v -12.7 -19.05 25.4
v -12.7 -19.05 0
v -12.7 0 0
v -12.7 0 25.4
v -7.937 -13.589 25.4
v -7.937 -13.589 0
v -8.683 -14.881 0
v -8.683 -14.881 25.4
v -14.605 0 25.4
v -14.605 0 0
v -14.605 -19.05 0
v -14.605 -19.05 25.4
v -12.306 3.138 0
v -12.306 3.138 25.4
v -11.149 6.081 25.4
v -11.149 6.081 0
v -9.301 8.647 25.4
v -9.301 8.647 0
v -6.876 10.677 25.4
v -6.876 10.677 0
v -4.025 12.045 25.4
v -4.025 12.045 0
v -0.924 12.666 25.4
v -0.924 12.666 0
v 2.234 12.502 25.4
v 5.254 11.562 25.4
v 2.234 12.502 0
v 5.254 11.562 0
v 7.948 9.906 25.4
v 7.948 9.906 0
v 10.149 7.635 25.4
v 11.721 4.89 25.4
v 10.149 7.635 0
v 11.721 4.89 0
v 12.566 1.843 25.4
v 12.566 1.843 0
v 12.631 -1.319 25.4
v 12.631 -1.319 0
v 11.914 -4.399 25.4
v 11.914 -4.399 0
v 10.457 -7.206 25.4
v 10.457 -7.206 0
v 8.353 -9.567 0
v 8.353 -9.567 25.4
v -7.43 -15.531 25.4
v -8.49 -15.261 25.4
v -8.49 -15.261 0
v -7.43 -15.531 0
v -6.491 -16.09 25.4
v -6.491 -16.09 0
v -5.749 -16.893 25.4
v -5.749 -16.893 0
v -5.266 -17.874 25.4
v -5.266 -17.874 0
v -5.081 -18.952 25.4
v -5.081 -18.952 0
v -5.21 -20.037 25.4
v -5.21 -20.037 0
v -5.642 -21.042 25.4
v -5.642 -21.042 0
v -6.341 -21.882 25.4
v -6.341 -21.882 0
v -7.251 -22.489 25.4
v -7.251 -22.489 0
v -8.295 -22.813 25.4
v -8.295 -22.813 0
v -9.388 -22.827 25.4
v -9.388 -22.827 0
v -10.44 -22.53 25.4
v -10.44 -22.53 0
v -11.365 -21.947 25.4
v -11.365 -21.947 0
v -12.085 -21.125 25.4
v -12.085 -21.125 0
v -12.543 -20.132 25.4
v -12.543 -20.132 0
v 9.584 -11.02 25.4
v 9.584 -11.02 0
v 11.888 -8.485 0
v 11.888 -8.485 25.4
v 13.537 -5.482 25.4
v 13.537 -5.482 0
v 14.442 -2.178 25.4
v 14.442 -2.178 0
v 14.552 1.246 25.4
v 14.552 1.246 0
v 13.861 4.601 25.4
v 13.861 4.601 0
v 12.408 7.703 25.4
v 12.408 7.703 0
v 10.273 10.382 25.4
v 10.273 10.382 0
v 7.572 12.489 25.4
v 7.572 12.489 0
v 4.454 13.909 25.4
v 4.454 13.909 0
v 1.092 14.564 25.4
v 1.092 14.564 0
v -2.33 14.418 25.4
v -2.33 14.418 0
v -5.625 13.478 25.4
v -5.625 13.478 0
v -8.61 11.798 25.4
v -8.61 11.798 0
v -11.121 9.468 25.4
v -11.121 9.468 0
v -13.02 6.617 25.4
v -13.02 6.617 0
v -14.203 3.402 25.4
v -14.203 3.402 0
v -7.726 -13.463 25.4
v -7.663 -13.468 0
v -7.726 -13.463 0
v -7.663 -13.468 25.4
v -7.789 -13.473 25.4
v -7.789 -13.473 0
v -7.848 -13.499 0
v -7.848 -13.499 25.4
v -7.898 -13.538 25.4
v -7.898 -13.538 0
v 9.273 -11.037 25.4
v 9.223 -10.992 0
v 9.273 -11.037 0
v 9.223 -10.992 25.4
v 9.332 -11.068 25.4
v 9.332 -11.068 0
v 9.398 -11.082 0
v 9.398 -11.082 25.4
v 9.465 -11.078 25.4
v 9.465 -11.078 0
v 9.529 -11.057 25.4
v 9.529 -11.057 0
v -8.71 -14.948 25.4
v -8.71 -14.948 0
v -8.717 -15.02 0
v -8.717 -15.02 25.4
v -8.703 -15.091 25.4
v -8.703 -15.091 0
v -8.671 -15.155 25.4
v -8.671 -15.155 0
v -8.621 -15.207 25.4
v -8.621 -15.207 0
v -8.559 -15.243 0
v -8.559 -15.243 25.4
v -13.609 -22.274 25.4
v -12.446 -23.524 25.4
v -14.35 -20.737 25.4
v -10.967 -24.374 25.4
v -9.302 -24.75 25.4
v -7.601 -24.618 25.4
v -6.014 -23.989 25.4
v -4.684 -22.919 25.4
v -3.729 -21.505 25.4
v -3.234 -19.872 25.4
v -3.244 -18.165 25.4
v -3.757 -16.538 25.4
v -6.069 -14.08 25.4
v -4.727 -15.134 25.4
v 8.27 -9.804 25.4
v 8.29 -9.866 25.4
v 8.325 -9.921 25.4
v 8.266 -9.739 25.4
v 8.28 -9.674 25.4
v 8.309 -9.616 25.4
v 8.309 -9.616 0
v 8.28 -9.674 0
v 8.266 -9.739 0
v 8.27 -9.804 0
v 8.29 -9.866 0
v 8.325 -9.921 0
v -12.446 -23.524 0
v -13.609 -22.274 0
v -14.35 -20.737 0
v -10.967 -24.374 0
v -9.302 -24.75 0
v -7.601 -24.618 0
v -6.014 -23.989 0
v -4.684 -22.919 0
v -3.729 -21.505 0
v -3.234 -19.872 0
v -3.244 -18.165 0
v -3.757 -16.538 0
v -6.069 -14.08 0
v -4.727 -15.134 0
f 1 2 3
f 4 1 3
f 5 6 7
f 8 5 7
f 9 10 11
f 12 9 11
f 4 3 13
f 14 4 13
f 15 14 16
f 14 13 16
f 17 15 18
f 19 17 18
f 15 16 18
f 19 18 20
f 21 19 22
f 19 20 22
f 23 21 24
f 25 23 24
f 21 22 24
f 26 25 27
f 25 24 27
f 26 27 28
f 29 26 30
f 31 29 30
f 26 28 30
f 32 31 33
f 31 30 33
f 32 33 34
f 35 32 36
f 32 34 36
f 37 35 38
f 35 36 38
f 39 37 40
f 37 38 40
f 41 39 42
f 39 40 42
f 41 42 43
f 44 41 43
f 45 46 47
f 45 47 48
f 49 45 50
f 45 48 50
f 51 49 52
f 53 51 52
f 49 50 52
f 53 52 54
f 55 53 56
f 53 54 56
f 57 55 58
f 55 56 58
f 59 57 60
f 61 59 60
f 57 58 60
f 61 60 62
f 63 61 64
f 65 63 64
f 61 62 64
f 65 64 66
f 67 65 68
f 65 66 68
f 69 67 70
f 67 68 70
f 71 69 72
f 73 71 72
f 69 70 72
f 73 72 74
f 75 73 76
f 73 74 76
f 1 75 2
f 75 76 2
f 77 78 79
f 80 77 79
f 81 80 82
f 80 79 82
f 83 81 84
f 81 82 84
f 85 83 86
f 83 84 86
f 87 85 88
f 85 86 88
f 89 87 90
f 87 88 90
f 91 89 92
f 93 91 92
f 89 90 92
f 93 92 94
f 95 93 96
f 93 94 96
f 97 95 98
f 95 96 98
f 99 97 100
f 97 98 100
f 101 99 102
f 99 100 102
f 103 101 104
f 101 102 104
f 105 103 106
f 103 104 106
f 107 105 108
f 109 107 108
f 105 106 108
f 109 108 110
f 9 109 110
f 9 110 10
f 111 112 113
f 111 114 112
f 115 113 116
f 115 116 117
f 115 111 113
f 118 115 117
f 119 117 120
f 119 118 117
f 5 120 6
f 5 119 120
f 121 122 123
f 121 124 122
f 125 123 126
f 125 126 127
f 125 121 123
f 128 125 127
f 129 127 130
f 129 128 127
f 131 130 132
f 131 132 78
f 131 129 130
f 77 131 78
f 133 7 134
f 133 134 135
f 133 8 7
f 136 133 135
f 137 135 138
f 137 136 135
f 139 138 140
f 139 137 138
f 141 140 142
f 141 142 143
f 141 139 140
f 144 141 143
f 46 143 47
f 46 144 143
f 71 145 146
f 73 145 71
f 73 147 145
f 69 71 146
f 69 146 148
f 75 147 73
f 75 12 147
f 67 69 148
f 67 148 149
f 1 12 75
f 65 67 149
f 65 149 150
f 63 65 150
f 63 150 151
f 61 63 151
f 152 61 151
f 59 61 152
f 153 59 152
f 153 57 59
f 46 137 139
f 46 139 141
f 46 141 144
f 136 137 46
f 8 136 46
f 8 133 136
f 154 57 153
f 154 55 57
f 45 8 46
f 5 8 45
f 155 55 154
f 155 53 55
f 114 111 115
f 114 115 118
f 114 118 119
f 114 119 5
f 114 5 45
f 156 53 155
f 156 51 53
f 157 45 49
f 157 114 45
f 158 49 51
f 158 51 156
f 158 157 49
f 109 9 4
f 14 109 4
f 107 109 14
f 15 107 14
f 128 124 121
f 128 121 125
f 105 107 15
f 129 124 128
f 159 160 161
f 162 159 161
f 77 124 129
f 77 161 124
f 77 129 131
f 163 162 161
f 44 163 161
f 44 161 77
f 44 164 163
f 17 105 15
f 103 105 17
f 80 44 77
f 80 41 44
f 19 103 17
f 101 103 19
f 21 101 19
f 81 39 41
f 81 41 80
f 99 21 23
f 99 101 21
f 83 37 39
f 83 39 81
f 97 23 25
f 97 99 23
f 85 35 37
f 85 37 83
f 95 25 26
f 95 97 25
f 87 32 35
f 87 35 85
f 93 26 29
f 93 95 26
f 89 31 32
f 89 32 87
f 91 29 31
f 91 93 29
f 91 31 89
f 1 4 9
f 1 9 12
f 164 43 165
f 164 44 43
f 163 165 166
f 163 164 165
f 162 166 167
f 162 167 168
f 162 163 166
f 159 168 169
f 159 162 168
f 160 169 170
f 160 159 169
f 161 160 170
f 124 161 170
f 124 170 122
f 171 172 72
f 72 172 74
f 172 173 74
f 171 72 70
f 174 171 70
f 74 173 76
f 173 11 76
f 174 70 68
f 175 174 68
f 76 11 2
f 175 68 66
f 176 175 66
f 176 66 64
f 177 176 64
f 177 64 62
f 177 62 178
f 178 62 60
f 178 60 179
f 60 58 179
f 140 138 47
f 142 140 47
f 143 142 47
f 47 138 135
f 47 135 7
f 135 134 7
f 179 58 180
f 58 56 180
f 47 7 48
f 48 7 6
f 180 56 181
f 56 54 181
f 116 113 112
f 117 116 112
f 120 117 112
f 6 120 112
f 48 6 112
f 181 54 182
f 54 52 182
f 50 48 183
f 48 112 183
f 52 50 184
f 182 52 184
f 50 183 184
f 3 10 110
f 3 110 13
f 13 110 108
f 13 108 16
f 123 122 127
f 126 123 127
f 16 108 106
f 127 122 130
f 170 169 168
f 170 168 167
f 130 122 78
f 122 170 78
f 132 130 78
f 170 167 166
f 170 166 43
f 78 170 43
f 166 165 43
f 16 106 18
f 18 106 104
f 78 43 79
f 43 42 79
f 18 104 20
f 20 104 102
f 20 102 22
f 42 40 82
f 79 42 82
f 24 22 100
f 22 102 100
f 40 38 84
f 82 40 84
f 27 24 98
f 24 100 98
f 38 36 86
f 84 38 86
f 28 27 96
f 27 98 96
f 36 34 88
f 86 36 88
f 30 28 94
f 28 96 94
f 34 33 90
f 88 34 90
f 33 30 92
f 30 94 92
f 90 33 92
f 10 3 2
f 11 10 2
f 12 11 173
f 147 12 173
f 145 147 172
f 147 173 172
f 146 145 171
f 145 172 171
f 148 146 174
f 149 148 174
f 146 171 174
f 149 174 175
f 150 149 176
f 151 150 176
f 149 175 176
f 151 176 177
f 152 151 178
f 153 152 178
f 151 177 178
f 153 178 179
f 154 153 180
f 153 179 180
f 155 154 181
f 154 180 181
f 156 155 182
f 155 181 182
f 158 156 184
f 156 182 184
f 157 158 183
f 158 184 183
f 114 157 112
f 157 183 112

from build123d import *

# Parameters (mm, degrees)
F1_DEPTH = 25.4
F2_R     = 0.254


with BuildPart() as f1:
    # F0 (on Top) → F1 (new body)
    with BuildSketch(Plane.XY):
        with BuildLine():
            Line((-12.7, -19.05), (-12.7, 0))
            ThreePointArc((-12.7, 0), (5.367252, 11.510109), (8.163403, -9.728764))
            Line((8.163403, -9.728764), (9.387913, -11.188079))
            ThreePointArc((9.387913, -11.188079), (6.17234, 13.236625), (-14.605, 0))
            Line((-14.605, 0), (-14.605, -19.05))
            ThreePointArc((-14.605, -19.05), (-5.23671, -23.444849), (-7.845702, -13.431222))
            Line((-7.845702, -13.431222), (-8.89, -15.24))
            ThreePointArc((-8.89, -15.24), (-6.195923, -21.744077), (-12.7, -19.05))
        make_face()
    extrude(amount=F1_DEPTH)

    # F2
    f2_edges = [f1.edges().sort_by_distance(p)[0] for p in [
        (8.163403, -9.728764, 12.7),
        (9.387913, -11.188079, 12.7),
        (-7.845702, -13.431222, 12.7),
        (-8.89, -15.24, 12.7),
    ]]
    fillet(f2_edges, radius=F2_R)


solid = f1.part
